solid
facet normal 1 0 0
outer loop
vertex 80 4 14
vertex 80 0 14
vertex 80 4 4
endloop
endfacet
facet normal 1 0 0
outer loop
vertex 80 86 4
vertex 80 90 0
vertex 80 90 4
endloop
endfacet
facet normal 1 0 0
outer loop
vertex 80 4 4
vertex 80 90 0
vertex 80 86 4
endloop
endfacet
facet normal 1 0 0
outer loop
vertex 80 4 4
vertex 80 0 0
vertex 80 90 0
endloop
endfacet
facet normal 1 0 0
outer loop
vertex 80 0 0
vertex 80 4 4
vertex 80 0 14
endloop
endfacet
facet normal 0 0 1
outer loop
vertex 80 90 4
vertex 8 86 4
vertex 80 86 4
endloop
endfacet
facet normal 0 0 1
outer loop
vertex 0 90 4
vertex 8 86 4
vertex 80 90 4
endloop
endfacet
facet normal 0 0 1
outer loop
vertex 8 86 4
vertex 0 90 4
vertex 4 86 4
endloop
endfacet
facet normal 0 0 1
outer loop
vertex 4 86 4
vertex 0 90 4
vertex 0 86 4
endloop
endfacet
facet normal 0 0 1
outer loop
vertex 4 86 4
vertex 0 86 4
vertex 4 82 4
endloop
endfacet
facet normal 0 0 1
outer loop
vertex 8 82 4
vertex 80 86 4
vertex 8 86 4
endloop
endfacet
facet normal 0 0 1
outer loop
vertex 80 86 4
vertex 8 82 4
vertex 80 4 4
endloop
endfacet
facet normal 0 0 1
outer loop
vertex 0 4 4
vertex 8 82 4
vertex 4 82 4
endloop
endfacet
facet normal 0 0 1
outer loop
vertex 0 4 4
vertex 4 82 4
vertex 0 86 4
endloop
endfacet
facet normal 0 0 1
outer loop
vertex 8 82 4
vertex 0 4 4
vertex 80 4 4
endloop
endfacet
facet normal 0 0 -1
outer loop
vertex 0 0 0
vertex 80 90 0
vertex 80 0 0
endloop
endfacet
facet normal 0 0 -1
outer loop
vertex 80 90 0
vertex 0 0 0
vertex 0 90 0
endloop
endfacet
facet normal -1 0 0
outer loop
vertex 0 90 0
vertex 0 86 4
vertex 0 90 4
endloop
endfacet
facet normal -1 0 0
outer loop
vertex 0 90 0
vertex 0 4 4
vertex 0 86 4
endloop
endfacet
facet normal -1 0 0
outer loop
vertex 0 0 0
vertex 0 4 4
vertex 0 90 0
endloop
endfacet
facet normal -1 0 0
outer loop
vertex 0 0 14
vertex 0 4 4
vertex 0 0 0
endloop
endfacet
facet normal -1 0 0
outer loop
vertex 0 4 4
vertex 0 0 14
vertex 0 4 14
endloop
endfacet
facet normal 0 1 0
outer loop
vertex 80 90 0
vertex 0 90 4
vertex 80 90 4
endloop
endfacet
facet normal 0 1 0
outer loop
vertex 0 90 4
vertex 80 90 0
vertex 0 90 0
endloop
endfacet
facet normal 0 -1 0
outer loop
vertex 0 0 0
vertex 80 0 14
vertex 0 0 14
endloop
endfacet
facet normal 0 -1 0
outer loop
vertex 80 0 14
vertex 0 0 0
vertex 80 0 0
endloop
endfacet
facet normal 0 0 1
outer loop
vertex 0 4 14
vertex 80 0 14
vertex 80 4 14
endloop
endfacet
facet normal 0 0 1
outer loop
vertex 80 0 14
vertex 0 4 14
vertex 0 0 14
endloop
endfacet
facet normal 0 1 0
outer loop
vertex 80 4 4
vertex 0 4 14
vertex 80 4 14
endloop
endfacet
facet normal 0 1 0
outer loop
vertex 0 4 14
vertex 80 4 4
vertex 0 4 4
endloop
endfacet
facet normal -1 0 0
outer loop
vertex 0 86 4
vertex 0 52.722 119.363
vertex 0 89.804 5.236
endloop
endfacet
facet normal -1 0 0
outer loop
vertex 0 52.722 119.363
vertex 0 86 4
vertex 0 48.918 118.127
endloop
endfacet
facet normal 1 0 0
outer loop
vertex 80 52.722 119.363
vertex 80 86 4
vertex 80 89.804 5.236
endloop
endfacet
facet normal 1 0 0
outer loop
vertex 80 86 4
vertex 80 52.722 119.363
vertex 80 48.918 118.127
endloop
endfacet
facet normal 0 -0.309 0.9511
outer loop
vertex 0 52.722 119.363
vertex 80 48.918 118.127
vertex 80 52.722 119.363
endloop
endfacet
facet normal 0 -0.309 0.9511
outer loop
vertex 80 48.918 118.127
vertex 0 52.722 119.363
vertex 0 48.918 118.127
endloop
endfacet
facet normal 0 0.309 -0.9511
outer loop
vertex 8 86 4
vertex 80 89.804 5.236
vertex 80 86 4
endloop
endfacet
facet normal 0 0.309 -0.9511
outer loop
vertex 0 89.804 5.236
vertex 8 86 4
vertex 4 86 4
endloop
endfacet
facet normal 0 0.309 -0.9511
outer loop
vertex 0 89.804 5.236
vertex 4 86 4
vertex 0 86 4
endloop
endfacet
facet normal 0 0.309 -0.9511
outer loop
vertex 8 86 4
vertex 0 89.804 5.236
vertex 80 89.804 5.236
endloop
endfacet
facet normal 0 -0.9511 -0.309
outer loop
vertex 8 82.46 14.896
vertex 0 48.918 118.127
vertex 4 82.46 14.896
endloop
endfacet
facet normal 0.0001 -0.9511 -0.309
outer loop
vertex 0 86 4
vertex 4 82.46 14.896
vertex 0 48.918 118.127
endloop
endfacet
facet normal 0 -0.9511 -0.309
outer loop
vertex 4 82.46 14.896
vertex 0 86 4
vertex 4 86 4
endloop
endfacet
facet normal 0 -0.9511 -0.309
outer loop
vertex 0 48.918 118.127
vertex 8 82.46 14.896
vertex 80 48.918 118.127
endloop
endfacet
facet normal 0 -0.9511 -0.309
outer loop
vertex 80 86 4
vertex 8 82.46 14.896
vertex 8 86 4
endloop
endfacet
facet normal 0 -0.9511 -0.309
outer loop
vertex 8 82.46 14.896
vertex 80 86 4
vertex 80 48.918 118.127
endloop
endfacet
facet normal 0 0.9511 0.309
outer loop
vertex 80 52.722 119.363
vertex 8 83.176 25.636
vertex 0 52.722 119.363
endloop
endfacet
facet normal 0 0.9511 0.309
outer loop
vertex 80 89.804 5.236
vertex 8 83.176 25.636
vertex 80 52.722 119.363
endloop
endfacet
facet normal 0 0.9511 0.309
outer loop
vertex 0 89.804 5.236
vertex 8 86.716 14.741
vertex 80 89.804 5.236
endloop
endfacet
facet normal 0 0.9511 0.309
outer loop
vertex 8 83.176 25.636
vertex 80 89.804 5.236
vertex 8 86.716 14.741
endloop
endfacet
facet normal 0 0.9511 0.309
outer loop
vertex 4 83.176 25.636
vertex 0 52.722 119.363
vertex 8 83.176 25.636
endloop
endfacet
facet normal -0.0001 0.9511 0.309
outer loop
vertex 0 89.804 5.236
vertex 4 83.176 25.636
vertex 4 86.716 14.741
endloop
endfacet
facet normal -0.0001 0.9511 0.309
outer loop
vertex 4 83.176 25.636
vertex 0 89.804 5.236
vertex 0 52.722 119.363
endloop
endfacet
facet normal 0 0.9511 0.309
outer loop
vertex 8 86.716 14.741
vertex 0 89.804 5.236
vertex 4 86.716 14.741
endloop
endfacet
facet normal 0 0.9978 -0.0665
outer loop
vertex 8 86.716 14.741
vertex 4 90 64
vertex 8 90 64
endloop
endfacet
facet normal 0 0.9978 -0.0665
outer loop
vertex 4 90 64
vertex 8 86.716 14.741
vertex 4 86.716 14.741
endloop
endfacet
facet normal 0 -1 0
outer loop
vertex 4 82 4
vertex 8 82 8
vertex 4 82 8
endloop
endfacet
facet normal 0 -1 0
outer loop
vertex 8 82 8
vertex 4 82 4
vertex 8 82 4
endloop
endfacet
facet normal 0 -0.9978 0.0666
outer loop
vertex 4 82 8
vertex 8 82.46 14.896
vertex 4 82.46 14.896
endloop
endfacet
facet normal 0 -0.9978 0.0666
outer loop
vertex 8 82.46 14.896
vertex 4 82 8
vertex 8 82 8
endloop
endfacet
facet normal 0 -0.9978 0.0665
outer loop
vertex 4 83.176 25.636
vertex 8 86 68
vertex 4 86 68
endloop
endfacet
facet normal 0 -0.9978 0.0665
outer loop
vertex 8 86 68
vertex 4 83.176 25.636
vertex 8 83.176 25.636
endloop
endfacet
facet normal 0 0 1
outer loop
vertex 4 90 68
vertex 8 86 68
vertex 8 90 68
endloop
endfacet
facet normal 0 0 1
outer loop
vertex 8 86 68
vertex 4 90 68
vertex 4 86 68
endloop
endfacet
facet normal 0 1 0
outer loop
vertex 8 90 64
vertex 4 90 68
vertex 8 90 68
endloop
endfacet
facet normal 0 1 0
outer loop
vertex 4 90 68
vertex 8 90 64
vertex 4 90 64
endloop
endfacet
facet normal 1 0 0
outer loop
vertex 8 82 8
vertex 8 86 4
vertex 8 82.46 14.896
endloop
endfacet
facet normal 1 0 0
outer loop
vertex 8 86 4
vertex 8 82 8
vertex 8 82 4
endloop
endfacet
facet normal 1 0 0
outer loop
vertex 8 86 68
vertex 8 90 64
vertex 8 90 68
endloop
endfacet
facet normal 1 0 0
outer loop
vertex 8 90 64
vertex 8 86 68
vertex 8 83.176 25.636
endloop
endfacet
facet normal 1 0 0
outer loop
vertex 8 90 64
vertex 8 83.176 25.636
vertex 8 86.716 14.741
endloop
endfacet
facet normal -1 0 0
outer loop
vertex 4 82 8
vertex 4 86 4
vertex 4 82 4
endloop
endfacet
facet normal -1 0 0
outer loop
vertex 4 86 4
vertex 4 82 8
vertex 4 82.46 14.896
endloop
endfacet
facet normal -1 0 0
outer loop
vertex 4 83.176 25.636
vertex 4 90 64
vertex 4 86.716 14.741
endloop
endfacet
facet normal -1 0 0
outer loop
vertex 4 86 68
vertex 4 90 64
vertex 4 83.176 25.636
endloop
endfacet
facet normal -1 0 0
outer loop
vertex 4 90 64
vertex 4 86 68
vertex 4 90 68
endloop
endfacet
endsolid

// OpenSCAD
base_width = 80;
base_depth = 90;
back_height = 120;
tilt_angle = 18;
panel_thickness = 4;
lip_height = 10;

module main() {
    union() {
        cube([base_width, base_depth, panel_thickness], center = false);
        translate([0, 0, panel_thickness])
            cube([base_width, panel_thickness, lip_height], center = false);
        translate([0, base_depth - panel_thickness, panel_thickness])
            rotate([tilt_angle, 0, 0])
                cube([base_width, panel_thickness, back_height], center = false);
        translate([panel_thickness, base_depth - 2 * panel_thickness, panel_thickness])
            hull() {
                cube([panel_thickness, panel_thickness, panel_thickness], center = false);
                translate([0, panel_thickness, back_height * 0.5])
                    cube([
                        panel_thickness,
                        panel_thickness,
                        panel_thickness
                    ], center = false);
            }
    }
}

main();
